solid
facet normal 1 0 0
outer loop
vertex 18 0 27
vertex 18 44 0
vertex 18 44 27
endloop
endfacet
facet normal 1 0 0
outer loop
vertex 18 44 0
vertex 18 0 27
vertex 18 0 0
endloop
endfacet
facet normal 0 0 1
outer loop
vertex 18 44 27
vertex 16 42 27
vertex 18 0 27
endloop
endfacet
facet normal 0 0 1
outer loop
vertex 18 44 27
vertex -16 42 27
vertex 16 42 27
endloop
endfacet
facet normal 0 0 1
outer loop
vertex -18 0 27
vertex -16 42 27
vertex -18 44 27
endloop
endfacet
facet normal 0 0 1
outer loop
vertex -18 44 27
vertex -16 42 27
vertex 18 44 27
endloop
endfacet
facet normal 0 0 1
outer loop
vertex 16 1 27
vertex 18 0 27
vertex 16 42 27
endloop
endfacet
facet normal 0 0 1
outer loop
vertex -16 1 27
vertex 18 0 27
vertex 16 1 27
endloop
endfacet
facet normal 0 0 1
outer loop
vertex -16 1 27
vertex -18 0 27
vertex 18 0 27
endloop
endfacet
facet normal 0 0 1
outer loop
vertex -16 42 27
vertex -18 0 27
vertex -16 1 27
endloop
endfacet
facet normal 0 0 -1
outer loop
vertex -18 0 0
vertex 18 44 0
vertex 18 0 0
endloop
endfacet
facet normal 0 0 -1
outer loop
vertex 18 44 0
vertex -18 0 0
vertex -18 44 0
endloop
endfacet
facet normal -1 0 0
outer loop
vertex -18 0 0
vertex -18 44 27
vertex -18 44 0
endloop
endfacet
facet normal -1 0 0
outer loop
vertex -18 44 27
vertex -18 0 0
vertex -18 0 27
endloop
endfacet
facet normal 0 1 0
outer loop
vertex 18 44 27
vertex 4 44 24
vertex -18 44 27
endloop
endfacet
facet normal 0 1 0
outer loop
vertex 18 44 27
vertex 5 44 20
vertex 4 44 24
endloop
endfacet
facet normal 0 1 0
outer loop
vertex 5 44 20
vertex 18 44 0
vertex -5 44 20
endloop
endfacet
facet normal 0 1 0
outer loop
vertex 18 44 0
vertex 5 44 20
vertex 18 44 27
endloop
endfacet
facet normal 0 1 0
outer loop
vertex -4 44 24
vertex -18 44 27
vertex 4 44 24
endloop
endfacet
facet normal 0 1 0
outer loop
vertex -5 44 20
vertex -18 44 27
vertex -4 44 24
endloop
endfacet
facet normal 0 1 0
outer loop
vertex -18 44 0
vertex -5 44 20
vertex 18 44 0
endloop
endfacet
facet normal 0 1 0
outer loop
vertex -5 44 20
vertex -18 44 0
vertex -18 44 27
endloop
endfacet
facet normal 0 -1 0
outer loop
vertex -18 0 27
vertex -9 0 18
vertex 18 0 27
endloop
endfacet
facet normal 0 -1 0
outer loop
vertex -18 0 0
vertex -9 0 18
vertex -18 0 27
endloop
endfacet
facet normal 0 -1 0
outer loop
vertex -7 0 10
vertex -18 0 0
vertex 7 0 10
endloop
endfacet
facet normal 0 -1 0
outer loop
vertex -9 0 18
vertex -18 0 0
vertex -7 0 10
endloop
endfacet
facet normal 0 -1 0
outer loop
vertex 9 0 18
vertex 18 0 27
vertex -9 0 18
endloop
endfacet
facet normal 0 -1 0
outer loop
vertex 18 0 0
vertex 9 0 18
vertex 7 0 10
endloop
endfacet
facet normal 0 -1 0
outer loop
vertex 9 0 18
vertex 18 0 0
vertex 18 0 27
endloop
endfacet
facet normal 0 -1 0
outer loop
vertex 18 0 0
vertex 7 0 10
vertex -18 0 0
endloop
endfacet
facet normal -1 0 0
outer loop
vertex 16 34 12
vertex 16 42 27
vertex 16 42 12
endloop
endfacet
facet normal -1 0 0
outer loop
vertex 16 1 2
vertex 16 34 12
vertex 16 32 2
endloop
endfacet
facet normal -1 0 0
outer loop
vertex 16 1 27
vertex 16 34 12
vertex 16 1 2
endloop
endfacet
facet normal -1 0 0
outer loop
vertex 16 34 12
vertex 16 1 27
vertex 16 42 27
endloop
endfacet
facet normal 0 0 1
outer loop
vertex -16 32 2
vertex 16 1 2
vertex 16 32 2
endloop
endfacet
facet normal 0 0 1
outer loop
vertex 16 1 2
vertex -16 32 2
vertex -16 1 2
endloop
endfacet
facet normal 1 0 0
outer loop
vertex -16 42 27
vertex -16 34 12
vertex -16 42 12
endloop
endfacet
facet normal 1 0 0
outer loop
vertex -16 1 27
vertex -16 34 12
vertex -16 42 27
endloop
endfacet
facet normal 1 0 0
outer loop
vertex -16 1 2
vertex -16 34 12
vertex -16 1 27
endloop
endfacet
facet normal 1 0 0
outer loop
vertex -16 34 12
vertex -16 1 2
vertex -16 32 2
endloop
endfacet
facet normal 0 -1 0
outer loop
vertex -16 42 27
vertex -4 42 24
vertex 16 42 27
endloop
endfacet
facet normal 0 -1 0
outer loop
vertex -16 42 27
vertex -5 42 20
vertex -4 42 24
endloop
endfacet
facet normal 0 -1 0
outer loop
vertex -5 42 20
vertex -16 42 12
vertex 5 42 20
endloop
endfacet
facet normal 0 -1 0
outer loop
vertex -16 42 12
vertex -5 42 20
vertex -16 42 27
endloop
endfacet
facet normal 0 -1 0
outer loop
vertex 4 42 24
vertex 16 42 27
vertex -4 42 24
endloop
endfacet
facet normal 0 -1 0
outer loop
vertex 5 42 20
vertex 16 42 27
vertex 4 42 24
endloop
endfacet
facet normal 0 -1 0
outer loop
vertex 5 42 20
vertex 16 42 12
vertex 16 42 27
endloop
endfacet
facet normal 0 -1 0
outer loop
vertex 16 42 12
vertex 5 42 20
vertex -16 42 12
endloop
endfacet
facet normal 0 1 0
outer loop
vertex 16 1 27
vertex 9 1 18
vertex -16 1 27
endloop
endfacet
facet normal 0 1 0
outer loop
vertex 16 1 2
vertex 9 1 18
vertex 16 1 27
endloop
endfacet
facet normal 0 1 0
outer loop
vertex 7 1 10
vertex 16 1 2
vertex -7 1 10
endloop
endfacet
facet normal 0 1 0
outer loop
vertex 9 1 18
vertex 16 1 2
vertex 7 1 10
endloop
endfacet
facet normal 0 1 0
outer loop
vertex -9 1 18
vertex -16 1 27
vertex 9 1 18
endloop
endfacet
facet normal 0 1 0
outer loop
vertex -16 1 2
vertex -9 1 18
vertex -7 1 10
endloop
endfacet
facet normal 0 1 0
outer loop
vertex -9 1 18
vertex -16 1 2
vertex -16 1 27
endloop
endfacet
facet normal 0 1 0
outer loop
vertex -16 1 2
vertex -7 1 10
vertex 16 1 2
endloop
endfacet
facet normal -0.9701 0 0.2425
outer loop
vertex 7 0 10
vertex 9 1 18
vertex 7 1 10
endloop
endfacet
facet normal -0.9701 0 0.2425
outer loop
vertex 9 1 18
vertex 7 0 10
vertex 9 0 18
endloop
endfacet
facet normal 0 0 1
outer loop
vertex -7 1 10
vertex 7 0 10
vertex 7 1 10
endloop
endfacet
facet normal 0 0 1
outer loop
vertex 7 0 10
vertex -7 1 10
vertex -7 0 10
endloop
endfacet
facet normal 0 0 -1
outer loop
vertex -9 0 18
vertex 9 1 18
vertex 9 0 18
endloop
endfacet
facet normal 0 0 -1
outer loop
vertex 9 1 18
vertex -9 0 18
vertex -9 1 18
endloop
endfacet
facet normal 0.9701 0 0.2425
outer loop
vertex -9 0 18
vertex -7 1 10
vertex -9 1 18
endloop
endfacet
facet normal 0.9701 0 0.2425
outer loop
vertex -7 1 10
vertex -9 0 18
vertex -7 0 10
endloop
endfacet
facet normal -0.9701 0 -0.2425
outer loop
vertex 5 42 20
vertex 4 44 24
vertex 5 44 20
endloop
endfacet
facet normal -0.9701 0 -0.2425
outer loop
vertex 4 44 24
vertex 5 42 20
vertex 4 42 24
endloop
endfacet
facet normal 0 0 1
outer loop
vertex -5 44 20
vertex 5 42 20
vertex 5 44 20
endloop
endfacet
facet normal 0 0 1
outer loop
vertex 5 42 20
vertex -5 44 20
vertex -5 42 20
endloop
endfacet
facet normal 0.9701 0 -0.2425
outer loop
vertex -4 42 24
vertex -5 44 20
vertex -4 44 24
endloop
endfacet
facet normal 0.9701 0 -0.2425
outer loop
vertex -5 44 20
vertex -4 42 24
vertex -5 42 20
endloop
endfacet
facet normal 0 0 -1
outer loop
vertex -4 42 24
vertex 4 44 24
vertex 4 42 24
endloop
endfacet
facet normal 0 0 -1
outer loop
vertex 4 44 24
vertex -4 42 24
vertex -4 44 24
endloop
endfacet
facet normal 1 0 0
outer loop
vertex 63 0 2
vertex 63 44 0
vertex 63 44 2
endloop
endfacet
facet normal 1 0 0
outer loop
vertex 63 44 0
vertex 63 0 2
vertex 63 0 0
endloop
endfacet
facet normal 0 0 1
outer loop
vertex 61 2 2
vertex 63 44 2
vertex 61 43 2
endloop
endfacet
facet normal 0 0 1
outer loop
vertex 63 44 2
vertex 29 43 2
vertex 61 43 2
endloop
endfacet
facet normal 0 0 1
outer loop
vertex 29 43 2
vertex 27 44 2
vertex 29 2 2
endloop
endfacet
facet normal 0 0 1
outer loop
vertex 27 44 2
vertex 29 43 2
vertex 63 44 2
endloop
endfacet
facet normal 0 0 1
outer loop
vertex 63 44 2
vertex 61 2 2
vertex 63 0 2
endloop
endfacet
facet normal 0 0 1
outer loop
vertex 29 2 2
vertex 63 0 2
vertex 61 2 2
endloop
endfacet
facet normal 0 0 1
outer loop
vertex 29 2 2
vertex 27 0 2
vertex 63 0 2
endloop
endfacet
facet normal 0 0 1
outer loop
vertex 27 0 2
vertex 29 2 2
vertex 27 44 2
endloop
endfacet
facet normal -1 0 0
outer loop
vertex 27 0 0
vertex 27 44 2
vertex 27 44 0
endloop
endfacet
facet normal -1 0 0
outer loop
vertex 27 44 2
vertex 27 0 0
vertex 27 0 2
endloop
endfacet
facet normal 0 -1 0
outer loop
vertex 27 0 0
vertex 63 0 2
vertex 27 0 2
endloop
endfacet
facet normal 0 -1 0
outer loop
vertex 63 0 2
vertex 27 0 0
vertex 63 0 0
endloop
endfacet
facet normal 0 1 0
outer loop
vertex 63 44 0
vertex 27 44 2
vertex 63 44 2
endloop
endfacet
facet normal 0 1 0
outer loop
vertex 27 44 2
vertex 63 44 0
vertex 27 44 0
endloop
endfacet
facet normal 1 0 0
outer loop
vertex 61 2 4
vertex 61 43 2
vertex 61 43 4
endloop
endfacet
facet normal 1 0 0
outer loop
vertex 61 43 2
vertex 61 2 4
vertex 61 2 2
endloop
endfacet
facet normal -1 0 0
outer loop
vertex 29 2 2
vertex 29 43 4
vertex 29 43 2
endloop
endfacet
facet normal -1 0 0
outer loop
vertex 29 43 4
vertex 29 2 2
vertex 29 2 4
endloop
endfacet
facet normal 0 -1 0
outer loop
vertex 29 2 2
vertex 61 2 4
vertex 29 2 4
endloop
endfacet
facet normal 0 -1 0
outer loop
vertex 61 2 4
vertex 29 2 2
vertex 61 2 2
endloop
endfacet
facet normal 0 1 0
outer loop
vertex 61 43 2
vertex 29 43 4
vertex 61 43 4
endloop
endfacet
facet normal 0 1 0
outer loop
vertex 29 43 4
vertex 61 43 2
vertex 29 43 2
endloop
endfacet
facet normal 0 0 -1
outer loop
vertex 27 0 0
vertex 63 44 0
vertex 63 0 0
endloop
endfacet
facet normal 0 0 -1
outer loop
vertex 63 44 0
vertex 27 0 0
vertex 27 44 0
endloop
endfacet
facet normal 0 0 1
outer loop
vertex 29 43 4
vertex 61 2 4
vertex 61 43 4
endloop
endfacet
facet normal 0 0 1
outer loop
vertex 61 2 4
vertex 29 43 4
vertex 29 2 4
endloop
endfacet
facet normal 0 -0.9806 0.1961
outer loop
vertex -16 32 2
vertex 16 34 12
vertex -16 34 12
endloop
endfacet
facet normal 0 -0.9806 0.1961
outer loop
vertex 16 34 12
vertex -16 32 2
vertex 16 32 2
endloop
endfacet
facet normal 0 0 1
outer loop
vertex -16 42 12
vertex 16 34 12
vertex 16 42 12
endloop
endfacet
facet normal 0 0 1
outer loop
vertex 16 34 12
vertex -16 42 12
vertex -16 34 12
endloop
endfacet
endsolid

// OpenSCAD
/**
Boite pour pimpMyEpson avec openScad
2017 (Fred)
**/

// La boite principale
module   boite()
{   
     // Intersection trapeze USB et boite
    difference() {
        // Intersection trapeze RS232 et boite
        difference() {
            // Intersection des 2 boites
            difference() {
                translate([-18,0,0]) cube ([36,44,27]);
                translate([-16,1,2]) cube ([32,41,25]);
            }
            translate([0,5,18])  rotate([90,180,0]) linear_extrude (height=10) polygon (points=[[-9,0],[9,0],[7,8],[-7,8]]);
        }
       translate([0,45,20])  rotate([90,0,0])  linear_extrude (height=10)  polygon (points=[[-5,0],[5,0],[4,4],[-4,4]]);
    }
}

// Le couvercle
module couvercle()
{
  // Intersection avec le couvercle
  rotate([180,0,0]) translate([45,-44,-29]) difference() {
                       // Couvercle
                       translate([-18,0,25]) cube ([36,44,4]);   
                       boite();
                       }
}

// La marche interne
module marche();
{
  // La marche interne
translate([-16,36,2]) rotate([90,0,90]) linear_extrude (height=32) polygon (points=[[-4,0],[6,0],[6,10],[-2,10]]);  
}

boite();
couvercle();
marche();
